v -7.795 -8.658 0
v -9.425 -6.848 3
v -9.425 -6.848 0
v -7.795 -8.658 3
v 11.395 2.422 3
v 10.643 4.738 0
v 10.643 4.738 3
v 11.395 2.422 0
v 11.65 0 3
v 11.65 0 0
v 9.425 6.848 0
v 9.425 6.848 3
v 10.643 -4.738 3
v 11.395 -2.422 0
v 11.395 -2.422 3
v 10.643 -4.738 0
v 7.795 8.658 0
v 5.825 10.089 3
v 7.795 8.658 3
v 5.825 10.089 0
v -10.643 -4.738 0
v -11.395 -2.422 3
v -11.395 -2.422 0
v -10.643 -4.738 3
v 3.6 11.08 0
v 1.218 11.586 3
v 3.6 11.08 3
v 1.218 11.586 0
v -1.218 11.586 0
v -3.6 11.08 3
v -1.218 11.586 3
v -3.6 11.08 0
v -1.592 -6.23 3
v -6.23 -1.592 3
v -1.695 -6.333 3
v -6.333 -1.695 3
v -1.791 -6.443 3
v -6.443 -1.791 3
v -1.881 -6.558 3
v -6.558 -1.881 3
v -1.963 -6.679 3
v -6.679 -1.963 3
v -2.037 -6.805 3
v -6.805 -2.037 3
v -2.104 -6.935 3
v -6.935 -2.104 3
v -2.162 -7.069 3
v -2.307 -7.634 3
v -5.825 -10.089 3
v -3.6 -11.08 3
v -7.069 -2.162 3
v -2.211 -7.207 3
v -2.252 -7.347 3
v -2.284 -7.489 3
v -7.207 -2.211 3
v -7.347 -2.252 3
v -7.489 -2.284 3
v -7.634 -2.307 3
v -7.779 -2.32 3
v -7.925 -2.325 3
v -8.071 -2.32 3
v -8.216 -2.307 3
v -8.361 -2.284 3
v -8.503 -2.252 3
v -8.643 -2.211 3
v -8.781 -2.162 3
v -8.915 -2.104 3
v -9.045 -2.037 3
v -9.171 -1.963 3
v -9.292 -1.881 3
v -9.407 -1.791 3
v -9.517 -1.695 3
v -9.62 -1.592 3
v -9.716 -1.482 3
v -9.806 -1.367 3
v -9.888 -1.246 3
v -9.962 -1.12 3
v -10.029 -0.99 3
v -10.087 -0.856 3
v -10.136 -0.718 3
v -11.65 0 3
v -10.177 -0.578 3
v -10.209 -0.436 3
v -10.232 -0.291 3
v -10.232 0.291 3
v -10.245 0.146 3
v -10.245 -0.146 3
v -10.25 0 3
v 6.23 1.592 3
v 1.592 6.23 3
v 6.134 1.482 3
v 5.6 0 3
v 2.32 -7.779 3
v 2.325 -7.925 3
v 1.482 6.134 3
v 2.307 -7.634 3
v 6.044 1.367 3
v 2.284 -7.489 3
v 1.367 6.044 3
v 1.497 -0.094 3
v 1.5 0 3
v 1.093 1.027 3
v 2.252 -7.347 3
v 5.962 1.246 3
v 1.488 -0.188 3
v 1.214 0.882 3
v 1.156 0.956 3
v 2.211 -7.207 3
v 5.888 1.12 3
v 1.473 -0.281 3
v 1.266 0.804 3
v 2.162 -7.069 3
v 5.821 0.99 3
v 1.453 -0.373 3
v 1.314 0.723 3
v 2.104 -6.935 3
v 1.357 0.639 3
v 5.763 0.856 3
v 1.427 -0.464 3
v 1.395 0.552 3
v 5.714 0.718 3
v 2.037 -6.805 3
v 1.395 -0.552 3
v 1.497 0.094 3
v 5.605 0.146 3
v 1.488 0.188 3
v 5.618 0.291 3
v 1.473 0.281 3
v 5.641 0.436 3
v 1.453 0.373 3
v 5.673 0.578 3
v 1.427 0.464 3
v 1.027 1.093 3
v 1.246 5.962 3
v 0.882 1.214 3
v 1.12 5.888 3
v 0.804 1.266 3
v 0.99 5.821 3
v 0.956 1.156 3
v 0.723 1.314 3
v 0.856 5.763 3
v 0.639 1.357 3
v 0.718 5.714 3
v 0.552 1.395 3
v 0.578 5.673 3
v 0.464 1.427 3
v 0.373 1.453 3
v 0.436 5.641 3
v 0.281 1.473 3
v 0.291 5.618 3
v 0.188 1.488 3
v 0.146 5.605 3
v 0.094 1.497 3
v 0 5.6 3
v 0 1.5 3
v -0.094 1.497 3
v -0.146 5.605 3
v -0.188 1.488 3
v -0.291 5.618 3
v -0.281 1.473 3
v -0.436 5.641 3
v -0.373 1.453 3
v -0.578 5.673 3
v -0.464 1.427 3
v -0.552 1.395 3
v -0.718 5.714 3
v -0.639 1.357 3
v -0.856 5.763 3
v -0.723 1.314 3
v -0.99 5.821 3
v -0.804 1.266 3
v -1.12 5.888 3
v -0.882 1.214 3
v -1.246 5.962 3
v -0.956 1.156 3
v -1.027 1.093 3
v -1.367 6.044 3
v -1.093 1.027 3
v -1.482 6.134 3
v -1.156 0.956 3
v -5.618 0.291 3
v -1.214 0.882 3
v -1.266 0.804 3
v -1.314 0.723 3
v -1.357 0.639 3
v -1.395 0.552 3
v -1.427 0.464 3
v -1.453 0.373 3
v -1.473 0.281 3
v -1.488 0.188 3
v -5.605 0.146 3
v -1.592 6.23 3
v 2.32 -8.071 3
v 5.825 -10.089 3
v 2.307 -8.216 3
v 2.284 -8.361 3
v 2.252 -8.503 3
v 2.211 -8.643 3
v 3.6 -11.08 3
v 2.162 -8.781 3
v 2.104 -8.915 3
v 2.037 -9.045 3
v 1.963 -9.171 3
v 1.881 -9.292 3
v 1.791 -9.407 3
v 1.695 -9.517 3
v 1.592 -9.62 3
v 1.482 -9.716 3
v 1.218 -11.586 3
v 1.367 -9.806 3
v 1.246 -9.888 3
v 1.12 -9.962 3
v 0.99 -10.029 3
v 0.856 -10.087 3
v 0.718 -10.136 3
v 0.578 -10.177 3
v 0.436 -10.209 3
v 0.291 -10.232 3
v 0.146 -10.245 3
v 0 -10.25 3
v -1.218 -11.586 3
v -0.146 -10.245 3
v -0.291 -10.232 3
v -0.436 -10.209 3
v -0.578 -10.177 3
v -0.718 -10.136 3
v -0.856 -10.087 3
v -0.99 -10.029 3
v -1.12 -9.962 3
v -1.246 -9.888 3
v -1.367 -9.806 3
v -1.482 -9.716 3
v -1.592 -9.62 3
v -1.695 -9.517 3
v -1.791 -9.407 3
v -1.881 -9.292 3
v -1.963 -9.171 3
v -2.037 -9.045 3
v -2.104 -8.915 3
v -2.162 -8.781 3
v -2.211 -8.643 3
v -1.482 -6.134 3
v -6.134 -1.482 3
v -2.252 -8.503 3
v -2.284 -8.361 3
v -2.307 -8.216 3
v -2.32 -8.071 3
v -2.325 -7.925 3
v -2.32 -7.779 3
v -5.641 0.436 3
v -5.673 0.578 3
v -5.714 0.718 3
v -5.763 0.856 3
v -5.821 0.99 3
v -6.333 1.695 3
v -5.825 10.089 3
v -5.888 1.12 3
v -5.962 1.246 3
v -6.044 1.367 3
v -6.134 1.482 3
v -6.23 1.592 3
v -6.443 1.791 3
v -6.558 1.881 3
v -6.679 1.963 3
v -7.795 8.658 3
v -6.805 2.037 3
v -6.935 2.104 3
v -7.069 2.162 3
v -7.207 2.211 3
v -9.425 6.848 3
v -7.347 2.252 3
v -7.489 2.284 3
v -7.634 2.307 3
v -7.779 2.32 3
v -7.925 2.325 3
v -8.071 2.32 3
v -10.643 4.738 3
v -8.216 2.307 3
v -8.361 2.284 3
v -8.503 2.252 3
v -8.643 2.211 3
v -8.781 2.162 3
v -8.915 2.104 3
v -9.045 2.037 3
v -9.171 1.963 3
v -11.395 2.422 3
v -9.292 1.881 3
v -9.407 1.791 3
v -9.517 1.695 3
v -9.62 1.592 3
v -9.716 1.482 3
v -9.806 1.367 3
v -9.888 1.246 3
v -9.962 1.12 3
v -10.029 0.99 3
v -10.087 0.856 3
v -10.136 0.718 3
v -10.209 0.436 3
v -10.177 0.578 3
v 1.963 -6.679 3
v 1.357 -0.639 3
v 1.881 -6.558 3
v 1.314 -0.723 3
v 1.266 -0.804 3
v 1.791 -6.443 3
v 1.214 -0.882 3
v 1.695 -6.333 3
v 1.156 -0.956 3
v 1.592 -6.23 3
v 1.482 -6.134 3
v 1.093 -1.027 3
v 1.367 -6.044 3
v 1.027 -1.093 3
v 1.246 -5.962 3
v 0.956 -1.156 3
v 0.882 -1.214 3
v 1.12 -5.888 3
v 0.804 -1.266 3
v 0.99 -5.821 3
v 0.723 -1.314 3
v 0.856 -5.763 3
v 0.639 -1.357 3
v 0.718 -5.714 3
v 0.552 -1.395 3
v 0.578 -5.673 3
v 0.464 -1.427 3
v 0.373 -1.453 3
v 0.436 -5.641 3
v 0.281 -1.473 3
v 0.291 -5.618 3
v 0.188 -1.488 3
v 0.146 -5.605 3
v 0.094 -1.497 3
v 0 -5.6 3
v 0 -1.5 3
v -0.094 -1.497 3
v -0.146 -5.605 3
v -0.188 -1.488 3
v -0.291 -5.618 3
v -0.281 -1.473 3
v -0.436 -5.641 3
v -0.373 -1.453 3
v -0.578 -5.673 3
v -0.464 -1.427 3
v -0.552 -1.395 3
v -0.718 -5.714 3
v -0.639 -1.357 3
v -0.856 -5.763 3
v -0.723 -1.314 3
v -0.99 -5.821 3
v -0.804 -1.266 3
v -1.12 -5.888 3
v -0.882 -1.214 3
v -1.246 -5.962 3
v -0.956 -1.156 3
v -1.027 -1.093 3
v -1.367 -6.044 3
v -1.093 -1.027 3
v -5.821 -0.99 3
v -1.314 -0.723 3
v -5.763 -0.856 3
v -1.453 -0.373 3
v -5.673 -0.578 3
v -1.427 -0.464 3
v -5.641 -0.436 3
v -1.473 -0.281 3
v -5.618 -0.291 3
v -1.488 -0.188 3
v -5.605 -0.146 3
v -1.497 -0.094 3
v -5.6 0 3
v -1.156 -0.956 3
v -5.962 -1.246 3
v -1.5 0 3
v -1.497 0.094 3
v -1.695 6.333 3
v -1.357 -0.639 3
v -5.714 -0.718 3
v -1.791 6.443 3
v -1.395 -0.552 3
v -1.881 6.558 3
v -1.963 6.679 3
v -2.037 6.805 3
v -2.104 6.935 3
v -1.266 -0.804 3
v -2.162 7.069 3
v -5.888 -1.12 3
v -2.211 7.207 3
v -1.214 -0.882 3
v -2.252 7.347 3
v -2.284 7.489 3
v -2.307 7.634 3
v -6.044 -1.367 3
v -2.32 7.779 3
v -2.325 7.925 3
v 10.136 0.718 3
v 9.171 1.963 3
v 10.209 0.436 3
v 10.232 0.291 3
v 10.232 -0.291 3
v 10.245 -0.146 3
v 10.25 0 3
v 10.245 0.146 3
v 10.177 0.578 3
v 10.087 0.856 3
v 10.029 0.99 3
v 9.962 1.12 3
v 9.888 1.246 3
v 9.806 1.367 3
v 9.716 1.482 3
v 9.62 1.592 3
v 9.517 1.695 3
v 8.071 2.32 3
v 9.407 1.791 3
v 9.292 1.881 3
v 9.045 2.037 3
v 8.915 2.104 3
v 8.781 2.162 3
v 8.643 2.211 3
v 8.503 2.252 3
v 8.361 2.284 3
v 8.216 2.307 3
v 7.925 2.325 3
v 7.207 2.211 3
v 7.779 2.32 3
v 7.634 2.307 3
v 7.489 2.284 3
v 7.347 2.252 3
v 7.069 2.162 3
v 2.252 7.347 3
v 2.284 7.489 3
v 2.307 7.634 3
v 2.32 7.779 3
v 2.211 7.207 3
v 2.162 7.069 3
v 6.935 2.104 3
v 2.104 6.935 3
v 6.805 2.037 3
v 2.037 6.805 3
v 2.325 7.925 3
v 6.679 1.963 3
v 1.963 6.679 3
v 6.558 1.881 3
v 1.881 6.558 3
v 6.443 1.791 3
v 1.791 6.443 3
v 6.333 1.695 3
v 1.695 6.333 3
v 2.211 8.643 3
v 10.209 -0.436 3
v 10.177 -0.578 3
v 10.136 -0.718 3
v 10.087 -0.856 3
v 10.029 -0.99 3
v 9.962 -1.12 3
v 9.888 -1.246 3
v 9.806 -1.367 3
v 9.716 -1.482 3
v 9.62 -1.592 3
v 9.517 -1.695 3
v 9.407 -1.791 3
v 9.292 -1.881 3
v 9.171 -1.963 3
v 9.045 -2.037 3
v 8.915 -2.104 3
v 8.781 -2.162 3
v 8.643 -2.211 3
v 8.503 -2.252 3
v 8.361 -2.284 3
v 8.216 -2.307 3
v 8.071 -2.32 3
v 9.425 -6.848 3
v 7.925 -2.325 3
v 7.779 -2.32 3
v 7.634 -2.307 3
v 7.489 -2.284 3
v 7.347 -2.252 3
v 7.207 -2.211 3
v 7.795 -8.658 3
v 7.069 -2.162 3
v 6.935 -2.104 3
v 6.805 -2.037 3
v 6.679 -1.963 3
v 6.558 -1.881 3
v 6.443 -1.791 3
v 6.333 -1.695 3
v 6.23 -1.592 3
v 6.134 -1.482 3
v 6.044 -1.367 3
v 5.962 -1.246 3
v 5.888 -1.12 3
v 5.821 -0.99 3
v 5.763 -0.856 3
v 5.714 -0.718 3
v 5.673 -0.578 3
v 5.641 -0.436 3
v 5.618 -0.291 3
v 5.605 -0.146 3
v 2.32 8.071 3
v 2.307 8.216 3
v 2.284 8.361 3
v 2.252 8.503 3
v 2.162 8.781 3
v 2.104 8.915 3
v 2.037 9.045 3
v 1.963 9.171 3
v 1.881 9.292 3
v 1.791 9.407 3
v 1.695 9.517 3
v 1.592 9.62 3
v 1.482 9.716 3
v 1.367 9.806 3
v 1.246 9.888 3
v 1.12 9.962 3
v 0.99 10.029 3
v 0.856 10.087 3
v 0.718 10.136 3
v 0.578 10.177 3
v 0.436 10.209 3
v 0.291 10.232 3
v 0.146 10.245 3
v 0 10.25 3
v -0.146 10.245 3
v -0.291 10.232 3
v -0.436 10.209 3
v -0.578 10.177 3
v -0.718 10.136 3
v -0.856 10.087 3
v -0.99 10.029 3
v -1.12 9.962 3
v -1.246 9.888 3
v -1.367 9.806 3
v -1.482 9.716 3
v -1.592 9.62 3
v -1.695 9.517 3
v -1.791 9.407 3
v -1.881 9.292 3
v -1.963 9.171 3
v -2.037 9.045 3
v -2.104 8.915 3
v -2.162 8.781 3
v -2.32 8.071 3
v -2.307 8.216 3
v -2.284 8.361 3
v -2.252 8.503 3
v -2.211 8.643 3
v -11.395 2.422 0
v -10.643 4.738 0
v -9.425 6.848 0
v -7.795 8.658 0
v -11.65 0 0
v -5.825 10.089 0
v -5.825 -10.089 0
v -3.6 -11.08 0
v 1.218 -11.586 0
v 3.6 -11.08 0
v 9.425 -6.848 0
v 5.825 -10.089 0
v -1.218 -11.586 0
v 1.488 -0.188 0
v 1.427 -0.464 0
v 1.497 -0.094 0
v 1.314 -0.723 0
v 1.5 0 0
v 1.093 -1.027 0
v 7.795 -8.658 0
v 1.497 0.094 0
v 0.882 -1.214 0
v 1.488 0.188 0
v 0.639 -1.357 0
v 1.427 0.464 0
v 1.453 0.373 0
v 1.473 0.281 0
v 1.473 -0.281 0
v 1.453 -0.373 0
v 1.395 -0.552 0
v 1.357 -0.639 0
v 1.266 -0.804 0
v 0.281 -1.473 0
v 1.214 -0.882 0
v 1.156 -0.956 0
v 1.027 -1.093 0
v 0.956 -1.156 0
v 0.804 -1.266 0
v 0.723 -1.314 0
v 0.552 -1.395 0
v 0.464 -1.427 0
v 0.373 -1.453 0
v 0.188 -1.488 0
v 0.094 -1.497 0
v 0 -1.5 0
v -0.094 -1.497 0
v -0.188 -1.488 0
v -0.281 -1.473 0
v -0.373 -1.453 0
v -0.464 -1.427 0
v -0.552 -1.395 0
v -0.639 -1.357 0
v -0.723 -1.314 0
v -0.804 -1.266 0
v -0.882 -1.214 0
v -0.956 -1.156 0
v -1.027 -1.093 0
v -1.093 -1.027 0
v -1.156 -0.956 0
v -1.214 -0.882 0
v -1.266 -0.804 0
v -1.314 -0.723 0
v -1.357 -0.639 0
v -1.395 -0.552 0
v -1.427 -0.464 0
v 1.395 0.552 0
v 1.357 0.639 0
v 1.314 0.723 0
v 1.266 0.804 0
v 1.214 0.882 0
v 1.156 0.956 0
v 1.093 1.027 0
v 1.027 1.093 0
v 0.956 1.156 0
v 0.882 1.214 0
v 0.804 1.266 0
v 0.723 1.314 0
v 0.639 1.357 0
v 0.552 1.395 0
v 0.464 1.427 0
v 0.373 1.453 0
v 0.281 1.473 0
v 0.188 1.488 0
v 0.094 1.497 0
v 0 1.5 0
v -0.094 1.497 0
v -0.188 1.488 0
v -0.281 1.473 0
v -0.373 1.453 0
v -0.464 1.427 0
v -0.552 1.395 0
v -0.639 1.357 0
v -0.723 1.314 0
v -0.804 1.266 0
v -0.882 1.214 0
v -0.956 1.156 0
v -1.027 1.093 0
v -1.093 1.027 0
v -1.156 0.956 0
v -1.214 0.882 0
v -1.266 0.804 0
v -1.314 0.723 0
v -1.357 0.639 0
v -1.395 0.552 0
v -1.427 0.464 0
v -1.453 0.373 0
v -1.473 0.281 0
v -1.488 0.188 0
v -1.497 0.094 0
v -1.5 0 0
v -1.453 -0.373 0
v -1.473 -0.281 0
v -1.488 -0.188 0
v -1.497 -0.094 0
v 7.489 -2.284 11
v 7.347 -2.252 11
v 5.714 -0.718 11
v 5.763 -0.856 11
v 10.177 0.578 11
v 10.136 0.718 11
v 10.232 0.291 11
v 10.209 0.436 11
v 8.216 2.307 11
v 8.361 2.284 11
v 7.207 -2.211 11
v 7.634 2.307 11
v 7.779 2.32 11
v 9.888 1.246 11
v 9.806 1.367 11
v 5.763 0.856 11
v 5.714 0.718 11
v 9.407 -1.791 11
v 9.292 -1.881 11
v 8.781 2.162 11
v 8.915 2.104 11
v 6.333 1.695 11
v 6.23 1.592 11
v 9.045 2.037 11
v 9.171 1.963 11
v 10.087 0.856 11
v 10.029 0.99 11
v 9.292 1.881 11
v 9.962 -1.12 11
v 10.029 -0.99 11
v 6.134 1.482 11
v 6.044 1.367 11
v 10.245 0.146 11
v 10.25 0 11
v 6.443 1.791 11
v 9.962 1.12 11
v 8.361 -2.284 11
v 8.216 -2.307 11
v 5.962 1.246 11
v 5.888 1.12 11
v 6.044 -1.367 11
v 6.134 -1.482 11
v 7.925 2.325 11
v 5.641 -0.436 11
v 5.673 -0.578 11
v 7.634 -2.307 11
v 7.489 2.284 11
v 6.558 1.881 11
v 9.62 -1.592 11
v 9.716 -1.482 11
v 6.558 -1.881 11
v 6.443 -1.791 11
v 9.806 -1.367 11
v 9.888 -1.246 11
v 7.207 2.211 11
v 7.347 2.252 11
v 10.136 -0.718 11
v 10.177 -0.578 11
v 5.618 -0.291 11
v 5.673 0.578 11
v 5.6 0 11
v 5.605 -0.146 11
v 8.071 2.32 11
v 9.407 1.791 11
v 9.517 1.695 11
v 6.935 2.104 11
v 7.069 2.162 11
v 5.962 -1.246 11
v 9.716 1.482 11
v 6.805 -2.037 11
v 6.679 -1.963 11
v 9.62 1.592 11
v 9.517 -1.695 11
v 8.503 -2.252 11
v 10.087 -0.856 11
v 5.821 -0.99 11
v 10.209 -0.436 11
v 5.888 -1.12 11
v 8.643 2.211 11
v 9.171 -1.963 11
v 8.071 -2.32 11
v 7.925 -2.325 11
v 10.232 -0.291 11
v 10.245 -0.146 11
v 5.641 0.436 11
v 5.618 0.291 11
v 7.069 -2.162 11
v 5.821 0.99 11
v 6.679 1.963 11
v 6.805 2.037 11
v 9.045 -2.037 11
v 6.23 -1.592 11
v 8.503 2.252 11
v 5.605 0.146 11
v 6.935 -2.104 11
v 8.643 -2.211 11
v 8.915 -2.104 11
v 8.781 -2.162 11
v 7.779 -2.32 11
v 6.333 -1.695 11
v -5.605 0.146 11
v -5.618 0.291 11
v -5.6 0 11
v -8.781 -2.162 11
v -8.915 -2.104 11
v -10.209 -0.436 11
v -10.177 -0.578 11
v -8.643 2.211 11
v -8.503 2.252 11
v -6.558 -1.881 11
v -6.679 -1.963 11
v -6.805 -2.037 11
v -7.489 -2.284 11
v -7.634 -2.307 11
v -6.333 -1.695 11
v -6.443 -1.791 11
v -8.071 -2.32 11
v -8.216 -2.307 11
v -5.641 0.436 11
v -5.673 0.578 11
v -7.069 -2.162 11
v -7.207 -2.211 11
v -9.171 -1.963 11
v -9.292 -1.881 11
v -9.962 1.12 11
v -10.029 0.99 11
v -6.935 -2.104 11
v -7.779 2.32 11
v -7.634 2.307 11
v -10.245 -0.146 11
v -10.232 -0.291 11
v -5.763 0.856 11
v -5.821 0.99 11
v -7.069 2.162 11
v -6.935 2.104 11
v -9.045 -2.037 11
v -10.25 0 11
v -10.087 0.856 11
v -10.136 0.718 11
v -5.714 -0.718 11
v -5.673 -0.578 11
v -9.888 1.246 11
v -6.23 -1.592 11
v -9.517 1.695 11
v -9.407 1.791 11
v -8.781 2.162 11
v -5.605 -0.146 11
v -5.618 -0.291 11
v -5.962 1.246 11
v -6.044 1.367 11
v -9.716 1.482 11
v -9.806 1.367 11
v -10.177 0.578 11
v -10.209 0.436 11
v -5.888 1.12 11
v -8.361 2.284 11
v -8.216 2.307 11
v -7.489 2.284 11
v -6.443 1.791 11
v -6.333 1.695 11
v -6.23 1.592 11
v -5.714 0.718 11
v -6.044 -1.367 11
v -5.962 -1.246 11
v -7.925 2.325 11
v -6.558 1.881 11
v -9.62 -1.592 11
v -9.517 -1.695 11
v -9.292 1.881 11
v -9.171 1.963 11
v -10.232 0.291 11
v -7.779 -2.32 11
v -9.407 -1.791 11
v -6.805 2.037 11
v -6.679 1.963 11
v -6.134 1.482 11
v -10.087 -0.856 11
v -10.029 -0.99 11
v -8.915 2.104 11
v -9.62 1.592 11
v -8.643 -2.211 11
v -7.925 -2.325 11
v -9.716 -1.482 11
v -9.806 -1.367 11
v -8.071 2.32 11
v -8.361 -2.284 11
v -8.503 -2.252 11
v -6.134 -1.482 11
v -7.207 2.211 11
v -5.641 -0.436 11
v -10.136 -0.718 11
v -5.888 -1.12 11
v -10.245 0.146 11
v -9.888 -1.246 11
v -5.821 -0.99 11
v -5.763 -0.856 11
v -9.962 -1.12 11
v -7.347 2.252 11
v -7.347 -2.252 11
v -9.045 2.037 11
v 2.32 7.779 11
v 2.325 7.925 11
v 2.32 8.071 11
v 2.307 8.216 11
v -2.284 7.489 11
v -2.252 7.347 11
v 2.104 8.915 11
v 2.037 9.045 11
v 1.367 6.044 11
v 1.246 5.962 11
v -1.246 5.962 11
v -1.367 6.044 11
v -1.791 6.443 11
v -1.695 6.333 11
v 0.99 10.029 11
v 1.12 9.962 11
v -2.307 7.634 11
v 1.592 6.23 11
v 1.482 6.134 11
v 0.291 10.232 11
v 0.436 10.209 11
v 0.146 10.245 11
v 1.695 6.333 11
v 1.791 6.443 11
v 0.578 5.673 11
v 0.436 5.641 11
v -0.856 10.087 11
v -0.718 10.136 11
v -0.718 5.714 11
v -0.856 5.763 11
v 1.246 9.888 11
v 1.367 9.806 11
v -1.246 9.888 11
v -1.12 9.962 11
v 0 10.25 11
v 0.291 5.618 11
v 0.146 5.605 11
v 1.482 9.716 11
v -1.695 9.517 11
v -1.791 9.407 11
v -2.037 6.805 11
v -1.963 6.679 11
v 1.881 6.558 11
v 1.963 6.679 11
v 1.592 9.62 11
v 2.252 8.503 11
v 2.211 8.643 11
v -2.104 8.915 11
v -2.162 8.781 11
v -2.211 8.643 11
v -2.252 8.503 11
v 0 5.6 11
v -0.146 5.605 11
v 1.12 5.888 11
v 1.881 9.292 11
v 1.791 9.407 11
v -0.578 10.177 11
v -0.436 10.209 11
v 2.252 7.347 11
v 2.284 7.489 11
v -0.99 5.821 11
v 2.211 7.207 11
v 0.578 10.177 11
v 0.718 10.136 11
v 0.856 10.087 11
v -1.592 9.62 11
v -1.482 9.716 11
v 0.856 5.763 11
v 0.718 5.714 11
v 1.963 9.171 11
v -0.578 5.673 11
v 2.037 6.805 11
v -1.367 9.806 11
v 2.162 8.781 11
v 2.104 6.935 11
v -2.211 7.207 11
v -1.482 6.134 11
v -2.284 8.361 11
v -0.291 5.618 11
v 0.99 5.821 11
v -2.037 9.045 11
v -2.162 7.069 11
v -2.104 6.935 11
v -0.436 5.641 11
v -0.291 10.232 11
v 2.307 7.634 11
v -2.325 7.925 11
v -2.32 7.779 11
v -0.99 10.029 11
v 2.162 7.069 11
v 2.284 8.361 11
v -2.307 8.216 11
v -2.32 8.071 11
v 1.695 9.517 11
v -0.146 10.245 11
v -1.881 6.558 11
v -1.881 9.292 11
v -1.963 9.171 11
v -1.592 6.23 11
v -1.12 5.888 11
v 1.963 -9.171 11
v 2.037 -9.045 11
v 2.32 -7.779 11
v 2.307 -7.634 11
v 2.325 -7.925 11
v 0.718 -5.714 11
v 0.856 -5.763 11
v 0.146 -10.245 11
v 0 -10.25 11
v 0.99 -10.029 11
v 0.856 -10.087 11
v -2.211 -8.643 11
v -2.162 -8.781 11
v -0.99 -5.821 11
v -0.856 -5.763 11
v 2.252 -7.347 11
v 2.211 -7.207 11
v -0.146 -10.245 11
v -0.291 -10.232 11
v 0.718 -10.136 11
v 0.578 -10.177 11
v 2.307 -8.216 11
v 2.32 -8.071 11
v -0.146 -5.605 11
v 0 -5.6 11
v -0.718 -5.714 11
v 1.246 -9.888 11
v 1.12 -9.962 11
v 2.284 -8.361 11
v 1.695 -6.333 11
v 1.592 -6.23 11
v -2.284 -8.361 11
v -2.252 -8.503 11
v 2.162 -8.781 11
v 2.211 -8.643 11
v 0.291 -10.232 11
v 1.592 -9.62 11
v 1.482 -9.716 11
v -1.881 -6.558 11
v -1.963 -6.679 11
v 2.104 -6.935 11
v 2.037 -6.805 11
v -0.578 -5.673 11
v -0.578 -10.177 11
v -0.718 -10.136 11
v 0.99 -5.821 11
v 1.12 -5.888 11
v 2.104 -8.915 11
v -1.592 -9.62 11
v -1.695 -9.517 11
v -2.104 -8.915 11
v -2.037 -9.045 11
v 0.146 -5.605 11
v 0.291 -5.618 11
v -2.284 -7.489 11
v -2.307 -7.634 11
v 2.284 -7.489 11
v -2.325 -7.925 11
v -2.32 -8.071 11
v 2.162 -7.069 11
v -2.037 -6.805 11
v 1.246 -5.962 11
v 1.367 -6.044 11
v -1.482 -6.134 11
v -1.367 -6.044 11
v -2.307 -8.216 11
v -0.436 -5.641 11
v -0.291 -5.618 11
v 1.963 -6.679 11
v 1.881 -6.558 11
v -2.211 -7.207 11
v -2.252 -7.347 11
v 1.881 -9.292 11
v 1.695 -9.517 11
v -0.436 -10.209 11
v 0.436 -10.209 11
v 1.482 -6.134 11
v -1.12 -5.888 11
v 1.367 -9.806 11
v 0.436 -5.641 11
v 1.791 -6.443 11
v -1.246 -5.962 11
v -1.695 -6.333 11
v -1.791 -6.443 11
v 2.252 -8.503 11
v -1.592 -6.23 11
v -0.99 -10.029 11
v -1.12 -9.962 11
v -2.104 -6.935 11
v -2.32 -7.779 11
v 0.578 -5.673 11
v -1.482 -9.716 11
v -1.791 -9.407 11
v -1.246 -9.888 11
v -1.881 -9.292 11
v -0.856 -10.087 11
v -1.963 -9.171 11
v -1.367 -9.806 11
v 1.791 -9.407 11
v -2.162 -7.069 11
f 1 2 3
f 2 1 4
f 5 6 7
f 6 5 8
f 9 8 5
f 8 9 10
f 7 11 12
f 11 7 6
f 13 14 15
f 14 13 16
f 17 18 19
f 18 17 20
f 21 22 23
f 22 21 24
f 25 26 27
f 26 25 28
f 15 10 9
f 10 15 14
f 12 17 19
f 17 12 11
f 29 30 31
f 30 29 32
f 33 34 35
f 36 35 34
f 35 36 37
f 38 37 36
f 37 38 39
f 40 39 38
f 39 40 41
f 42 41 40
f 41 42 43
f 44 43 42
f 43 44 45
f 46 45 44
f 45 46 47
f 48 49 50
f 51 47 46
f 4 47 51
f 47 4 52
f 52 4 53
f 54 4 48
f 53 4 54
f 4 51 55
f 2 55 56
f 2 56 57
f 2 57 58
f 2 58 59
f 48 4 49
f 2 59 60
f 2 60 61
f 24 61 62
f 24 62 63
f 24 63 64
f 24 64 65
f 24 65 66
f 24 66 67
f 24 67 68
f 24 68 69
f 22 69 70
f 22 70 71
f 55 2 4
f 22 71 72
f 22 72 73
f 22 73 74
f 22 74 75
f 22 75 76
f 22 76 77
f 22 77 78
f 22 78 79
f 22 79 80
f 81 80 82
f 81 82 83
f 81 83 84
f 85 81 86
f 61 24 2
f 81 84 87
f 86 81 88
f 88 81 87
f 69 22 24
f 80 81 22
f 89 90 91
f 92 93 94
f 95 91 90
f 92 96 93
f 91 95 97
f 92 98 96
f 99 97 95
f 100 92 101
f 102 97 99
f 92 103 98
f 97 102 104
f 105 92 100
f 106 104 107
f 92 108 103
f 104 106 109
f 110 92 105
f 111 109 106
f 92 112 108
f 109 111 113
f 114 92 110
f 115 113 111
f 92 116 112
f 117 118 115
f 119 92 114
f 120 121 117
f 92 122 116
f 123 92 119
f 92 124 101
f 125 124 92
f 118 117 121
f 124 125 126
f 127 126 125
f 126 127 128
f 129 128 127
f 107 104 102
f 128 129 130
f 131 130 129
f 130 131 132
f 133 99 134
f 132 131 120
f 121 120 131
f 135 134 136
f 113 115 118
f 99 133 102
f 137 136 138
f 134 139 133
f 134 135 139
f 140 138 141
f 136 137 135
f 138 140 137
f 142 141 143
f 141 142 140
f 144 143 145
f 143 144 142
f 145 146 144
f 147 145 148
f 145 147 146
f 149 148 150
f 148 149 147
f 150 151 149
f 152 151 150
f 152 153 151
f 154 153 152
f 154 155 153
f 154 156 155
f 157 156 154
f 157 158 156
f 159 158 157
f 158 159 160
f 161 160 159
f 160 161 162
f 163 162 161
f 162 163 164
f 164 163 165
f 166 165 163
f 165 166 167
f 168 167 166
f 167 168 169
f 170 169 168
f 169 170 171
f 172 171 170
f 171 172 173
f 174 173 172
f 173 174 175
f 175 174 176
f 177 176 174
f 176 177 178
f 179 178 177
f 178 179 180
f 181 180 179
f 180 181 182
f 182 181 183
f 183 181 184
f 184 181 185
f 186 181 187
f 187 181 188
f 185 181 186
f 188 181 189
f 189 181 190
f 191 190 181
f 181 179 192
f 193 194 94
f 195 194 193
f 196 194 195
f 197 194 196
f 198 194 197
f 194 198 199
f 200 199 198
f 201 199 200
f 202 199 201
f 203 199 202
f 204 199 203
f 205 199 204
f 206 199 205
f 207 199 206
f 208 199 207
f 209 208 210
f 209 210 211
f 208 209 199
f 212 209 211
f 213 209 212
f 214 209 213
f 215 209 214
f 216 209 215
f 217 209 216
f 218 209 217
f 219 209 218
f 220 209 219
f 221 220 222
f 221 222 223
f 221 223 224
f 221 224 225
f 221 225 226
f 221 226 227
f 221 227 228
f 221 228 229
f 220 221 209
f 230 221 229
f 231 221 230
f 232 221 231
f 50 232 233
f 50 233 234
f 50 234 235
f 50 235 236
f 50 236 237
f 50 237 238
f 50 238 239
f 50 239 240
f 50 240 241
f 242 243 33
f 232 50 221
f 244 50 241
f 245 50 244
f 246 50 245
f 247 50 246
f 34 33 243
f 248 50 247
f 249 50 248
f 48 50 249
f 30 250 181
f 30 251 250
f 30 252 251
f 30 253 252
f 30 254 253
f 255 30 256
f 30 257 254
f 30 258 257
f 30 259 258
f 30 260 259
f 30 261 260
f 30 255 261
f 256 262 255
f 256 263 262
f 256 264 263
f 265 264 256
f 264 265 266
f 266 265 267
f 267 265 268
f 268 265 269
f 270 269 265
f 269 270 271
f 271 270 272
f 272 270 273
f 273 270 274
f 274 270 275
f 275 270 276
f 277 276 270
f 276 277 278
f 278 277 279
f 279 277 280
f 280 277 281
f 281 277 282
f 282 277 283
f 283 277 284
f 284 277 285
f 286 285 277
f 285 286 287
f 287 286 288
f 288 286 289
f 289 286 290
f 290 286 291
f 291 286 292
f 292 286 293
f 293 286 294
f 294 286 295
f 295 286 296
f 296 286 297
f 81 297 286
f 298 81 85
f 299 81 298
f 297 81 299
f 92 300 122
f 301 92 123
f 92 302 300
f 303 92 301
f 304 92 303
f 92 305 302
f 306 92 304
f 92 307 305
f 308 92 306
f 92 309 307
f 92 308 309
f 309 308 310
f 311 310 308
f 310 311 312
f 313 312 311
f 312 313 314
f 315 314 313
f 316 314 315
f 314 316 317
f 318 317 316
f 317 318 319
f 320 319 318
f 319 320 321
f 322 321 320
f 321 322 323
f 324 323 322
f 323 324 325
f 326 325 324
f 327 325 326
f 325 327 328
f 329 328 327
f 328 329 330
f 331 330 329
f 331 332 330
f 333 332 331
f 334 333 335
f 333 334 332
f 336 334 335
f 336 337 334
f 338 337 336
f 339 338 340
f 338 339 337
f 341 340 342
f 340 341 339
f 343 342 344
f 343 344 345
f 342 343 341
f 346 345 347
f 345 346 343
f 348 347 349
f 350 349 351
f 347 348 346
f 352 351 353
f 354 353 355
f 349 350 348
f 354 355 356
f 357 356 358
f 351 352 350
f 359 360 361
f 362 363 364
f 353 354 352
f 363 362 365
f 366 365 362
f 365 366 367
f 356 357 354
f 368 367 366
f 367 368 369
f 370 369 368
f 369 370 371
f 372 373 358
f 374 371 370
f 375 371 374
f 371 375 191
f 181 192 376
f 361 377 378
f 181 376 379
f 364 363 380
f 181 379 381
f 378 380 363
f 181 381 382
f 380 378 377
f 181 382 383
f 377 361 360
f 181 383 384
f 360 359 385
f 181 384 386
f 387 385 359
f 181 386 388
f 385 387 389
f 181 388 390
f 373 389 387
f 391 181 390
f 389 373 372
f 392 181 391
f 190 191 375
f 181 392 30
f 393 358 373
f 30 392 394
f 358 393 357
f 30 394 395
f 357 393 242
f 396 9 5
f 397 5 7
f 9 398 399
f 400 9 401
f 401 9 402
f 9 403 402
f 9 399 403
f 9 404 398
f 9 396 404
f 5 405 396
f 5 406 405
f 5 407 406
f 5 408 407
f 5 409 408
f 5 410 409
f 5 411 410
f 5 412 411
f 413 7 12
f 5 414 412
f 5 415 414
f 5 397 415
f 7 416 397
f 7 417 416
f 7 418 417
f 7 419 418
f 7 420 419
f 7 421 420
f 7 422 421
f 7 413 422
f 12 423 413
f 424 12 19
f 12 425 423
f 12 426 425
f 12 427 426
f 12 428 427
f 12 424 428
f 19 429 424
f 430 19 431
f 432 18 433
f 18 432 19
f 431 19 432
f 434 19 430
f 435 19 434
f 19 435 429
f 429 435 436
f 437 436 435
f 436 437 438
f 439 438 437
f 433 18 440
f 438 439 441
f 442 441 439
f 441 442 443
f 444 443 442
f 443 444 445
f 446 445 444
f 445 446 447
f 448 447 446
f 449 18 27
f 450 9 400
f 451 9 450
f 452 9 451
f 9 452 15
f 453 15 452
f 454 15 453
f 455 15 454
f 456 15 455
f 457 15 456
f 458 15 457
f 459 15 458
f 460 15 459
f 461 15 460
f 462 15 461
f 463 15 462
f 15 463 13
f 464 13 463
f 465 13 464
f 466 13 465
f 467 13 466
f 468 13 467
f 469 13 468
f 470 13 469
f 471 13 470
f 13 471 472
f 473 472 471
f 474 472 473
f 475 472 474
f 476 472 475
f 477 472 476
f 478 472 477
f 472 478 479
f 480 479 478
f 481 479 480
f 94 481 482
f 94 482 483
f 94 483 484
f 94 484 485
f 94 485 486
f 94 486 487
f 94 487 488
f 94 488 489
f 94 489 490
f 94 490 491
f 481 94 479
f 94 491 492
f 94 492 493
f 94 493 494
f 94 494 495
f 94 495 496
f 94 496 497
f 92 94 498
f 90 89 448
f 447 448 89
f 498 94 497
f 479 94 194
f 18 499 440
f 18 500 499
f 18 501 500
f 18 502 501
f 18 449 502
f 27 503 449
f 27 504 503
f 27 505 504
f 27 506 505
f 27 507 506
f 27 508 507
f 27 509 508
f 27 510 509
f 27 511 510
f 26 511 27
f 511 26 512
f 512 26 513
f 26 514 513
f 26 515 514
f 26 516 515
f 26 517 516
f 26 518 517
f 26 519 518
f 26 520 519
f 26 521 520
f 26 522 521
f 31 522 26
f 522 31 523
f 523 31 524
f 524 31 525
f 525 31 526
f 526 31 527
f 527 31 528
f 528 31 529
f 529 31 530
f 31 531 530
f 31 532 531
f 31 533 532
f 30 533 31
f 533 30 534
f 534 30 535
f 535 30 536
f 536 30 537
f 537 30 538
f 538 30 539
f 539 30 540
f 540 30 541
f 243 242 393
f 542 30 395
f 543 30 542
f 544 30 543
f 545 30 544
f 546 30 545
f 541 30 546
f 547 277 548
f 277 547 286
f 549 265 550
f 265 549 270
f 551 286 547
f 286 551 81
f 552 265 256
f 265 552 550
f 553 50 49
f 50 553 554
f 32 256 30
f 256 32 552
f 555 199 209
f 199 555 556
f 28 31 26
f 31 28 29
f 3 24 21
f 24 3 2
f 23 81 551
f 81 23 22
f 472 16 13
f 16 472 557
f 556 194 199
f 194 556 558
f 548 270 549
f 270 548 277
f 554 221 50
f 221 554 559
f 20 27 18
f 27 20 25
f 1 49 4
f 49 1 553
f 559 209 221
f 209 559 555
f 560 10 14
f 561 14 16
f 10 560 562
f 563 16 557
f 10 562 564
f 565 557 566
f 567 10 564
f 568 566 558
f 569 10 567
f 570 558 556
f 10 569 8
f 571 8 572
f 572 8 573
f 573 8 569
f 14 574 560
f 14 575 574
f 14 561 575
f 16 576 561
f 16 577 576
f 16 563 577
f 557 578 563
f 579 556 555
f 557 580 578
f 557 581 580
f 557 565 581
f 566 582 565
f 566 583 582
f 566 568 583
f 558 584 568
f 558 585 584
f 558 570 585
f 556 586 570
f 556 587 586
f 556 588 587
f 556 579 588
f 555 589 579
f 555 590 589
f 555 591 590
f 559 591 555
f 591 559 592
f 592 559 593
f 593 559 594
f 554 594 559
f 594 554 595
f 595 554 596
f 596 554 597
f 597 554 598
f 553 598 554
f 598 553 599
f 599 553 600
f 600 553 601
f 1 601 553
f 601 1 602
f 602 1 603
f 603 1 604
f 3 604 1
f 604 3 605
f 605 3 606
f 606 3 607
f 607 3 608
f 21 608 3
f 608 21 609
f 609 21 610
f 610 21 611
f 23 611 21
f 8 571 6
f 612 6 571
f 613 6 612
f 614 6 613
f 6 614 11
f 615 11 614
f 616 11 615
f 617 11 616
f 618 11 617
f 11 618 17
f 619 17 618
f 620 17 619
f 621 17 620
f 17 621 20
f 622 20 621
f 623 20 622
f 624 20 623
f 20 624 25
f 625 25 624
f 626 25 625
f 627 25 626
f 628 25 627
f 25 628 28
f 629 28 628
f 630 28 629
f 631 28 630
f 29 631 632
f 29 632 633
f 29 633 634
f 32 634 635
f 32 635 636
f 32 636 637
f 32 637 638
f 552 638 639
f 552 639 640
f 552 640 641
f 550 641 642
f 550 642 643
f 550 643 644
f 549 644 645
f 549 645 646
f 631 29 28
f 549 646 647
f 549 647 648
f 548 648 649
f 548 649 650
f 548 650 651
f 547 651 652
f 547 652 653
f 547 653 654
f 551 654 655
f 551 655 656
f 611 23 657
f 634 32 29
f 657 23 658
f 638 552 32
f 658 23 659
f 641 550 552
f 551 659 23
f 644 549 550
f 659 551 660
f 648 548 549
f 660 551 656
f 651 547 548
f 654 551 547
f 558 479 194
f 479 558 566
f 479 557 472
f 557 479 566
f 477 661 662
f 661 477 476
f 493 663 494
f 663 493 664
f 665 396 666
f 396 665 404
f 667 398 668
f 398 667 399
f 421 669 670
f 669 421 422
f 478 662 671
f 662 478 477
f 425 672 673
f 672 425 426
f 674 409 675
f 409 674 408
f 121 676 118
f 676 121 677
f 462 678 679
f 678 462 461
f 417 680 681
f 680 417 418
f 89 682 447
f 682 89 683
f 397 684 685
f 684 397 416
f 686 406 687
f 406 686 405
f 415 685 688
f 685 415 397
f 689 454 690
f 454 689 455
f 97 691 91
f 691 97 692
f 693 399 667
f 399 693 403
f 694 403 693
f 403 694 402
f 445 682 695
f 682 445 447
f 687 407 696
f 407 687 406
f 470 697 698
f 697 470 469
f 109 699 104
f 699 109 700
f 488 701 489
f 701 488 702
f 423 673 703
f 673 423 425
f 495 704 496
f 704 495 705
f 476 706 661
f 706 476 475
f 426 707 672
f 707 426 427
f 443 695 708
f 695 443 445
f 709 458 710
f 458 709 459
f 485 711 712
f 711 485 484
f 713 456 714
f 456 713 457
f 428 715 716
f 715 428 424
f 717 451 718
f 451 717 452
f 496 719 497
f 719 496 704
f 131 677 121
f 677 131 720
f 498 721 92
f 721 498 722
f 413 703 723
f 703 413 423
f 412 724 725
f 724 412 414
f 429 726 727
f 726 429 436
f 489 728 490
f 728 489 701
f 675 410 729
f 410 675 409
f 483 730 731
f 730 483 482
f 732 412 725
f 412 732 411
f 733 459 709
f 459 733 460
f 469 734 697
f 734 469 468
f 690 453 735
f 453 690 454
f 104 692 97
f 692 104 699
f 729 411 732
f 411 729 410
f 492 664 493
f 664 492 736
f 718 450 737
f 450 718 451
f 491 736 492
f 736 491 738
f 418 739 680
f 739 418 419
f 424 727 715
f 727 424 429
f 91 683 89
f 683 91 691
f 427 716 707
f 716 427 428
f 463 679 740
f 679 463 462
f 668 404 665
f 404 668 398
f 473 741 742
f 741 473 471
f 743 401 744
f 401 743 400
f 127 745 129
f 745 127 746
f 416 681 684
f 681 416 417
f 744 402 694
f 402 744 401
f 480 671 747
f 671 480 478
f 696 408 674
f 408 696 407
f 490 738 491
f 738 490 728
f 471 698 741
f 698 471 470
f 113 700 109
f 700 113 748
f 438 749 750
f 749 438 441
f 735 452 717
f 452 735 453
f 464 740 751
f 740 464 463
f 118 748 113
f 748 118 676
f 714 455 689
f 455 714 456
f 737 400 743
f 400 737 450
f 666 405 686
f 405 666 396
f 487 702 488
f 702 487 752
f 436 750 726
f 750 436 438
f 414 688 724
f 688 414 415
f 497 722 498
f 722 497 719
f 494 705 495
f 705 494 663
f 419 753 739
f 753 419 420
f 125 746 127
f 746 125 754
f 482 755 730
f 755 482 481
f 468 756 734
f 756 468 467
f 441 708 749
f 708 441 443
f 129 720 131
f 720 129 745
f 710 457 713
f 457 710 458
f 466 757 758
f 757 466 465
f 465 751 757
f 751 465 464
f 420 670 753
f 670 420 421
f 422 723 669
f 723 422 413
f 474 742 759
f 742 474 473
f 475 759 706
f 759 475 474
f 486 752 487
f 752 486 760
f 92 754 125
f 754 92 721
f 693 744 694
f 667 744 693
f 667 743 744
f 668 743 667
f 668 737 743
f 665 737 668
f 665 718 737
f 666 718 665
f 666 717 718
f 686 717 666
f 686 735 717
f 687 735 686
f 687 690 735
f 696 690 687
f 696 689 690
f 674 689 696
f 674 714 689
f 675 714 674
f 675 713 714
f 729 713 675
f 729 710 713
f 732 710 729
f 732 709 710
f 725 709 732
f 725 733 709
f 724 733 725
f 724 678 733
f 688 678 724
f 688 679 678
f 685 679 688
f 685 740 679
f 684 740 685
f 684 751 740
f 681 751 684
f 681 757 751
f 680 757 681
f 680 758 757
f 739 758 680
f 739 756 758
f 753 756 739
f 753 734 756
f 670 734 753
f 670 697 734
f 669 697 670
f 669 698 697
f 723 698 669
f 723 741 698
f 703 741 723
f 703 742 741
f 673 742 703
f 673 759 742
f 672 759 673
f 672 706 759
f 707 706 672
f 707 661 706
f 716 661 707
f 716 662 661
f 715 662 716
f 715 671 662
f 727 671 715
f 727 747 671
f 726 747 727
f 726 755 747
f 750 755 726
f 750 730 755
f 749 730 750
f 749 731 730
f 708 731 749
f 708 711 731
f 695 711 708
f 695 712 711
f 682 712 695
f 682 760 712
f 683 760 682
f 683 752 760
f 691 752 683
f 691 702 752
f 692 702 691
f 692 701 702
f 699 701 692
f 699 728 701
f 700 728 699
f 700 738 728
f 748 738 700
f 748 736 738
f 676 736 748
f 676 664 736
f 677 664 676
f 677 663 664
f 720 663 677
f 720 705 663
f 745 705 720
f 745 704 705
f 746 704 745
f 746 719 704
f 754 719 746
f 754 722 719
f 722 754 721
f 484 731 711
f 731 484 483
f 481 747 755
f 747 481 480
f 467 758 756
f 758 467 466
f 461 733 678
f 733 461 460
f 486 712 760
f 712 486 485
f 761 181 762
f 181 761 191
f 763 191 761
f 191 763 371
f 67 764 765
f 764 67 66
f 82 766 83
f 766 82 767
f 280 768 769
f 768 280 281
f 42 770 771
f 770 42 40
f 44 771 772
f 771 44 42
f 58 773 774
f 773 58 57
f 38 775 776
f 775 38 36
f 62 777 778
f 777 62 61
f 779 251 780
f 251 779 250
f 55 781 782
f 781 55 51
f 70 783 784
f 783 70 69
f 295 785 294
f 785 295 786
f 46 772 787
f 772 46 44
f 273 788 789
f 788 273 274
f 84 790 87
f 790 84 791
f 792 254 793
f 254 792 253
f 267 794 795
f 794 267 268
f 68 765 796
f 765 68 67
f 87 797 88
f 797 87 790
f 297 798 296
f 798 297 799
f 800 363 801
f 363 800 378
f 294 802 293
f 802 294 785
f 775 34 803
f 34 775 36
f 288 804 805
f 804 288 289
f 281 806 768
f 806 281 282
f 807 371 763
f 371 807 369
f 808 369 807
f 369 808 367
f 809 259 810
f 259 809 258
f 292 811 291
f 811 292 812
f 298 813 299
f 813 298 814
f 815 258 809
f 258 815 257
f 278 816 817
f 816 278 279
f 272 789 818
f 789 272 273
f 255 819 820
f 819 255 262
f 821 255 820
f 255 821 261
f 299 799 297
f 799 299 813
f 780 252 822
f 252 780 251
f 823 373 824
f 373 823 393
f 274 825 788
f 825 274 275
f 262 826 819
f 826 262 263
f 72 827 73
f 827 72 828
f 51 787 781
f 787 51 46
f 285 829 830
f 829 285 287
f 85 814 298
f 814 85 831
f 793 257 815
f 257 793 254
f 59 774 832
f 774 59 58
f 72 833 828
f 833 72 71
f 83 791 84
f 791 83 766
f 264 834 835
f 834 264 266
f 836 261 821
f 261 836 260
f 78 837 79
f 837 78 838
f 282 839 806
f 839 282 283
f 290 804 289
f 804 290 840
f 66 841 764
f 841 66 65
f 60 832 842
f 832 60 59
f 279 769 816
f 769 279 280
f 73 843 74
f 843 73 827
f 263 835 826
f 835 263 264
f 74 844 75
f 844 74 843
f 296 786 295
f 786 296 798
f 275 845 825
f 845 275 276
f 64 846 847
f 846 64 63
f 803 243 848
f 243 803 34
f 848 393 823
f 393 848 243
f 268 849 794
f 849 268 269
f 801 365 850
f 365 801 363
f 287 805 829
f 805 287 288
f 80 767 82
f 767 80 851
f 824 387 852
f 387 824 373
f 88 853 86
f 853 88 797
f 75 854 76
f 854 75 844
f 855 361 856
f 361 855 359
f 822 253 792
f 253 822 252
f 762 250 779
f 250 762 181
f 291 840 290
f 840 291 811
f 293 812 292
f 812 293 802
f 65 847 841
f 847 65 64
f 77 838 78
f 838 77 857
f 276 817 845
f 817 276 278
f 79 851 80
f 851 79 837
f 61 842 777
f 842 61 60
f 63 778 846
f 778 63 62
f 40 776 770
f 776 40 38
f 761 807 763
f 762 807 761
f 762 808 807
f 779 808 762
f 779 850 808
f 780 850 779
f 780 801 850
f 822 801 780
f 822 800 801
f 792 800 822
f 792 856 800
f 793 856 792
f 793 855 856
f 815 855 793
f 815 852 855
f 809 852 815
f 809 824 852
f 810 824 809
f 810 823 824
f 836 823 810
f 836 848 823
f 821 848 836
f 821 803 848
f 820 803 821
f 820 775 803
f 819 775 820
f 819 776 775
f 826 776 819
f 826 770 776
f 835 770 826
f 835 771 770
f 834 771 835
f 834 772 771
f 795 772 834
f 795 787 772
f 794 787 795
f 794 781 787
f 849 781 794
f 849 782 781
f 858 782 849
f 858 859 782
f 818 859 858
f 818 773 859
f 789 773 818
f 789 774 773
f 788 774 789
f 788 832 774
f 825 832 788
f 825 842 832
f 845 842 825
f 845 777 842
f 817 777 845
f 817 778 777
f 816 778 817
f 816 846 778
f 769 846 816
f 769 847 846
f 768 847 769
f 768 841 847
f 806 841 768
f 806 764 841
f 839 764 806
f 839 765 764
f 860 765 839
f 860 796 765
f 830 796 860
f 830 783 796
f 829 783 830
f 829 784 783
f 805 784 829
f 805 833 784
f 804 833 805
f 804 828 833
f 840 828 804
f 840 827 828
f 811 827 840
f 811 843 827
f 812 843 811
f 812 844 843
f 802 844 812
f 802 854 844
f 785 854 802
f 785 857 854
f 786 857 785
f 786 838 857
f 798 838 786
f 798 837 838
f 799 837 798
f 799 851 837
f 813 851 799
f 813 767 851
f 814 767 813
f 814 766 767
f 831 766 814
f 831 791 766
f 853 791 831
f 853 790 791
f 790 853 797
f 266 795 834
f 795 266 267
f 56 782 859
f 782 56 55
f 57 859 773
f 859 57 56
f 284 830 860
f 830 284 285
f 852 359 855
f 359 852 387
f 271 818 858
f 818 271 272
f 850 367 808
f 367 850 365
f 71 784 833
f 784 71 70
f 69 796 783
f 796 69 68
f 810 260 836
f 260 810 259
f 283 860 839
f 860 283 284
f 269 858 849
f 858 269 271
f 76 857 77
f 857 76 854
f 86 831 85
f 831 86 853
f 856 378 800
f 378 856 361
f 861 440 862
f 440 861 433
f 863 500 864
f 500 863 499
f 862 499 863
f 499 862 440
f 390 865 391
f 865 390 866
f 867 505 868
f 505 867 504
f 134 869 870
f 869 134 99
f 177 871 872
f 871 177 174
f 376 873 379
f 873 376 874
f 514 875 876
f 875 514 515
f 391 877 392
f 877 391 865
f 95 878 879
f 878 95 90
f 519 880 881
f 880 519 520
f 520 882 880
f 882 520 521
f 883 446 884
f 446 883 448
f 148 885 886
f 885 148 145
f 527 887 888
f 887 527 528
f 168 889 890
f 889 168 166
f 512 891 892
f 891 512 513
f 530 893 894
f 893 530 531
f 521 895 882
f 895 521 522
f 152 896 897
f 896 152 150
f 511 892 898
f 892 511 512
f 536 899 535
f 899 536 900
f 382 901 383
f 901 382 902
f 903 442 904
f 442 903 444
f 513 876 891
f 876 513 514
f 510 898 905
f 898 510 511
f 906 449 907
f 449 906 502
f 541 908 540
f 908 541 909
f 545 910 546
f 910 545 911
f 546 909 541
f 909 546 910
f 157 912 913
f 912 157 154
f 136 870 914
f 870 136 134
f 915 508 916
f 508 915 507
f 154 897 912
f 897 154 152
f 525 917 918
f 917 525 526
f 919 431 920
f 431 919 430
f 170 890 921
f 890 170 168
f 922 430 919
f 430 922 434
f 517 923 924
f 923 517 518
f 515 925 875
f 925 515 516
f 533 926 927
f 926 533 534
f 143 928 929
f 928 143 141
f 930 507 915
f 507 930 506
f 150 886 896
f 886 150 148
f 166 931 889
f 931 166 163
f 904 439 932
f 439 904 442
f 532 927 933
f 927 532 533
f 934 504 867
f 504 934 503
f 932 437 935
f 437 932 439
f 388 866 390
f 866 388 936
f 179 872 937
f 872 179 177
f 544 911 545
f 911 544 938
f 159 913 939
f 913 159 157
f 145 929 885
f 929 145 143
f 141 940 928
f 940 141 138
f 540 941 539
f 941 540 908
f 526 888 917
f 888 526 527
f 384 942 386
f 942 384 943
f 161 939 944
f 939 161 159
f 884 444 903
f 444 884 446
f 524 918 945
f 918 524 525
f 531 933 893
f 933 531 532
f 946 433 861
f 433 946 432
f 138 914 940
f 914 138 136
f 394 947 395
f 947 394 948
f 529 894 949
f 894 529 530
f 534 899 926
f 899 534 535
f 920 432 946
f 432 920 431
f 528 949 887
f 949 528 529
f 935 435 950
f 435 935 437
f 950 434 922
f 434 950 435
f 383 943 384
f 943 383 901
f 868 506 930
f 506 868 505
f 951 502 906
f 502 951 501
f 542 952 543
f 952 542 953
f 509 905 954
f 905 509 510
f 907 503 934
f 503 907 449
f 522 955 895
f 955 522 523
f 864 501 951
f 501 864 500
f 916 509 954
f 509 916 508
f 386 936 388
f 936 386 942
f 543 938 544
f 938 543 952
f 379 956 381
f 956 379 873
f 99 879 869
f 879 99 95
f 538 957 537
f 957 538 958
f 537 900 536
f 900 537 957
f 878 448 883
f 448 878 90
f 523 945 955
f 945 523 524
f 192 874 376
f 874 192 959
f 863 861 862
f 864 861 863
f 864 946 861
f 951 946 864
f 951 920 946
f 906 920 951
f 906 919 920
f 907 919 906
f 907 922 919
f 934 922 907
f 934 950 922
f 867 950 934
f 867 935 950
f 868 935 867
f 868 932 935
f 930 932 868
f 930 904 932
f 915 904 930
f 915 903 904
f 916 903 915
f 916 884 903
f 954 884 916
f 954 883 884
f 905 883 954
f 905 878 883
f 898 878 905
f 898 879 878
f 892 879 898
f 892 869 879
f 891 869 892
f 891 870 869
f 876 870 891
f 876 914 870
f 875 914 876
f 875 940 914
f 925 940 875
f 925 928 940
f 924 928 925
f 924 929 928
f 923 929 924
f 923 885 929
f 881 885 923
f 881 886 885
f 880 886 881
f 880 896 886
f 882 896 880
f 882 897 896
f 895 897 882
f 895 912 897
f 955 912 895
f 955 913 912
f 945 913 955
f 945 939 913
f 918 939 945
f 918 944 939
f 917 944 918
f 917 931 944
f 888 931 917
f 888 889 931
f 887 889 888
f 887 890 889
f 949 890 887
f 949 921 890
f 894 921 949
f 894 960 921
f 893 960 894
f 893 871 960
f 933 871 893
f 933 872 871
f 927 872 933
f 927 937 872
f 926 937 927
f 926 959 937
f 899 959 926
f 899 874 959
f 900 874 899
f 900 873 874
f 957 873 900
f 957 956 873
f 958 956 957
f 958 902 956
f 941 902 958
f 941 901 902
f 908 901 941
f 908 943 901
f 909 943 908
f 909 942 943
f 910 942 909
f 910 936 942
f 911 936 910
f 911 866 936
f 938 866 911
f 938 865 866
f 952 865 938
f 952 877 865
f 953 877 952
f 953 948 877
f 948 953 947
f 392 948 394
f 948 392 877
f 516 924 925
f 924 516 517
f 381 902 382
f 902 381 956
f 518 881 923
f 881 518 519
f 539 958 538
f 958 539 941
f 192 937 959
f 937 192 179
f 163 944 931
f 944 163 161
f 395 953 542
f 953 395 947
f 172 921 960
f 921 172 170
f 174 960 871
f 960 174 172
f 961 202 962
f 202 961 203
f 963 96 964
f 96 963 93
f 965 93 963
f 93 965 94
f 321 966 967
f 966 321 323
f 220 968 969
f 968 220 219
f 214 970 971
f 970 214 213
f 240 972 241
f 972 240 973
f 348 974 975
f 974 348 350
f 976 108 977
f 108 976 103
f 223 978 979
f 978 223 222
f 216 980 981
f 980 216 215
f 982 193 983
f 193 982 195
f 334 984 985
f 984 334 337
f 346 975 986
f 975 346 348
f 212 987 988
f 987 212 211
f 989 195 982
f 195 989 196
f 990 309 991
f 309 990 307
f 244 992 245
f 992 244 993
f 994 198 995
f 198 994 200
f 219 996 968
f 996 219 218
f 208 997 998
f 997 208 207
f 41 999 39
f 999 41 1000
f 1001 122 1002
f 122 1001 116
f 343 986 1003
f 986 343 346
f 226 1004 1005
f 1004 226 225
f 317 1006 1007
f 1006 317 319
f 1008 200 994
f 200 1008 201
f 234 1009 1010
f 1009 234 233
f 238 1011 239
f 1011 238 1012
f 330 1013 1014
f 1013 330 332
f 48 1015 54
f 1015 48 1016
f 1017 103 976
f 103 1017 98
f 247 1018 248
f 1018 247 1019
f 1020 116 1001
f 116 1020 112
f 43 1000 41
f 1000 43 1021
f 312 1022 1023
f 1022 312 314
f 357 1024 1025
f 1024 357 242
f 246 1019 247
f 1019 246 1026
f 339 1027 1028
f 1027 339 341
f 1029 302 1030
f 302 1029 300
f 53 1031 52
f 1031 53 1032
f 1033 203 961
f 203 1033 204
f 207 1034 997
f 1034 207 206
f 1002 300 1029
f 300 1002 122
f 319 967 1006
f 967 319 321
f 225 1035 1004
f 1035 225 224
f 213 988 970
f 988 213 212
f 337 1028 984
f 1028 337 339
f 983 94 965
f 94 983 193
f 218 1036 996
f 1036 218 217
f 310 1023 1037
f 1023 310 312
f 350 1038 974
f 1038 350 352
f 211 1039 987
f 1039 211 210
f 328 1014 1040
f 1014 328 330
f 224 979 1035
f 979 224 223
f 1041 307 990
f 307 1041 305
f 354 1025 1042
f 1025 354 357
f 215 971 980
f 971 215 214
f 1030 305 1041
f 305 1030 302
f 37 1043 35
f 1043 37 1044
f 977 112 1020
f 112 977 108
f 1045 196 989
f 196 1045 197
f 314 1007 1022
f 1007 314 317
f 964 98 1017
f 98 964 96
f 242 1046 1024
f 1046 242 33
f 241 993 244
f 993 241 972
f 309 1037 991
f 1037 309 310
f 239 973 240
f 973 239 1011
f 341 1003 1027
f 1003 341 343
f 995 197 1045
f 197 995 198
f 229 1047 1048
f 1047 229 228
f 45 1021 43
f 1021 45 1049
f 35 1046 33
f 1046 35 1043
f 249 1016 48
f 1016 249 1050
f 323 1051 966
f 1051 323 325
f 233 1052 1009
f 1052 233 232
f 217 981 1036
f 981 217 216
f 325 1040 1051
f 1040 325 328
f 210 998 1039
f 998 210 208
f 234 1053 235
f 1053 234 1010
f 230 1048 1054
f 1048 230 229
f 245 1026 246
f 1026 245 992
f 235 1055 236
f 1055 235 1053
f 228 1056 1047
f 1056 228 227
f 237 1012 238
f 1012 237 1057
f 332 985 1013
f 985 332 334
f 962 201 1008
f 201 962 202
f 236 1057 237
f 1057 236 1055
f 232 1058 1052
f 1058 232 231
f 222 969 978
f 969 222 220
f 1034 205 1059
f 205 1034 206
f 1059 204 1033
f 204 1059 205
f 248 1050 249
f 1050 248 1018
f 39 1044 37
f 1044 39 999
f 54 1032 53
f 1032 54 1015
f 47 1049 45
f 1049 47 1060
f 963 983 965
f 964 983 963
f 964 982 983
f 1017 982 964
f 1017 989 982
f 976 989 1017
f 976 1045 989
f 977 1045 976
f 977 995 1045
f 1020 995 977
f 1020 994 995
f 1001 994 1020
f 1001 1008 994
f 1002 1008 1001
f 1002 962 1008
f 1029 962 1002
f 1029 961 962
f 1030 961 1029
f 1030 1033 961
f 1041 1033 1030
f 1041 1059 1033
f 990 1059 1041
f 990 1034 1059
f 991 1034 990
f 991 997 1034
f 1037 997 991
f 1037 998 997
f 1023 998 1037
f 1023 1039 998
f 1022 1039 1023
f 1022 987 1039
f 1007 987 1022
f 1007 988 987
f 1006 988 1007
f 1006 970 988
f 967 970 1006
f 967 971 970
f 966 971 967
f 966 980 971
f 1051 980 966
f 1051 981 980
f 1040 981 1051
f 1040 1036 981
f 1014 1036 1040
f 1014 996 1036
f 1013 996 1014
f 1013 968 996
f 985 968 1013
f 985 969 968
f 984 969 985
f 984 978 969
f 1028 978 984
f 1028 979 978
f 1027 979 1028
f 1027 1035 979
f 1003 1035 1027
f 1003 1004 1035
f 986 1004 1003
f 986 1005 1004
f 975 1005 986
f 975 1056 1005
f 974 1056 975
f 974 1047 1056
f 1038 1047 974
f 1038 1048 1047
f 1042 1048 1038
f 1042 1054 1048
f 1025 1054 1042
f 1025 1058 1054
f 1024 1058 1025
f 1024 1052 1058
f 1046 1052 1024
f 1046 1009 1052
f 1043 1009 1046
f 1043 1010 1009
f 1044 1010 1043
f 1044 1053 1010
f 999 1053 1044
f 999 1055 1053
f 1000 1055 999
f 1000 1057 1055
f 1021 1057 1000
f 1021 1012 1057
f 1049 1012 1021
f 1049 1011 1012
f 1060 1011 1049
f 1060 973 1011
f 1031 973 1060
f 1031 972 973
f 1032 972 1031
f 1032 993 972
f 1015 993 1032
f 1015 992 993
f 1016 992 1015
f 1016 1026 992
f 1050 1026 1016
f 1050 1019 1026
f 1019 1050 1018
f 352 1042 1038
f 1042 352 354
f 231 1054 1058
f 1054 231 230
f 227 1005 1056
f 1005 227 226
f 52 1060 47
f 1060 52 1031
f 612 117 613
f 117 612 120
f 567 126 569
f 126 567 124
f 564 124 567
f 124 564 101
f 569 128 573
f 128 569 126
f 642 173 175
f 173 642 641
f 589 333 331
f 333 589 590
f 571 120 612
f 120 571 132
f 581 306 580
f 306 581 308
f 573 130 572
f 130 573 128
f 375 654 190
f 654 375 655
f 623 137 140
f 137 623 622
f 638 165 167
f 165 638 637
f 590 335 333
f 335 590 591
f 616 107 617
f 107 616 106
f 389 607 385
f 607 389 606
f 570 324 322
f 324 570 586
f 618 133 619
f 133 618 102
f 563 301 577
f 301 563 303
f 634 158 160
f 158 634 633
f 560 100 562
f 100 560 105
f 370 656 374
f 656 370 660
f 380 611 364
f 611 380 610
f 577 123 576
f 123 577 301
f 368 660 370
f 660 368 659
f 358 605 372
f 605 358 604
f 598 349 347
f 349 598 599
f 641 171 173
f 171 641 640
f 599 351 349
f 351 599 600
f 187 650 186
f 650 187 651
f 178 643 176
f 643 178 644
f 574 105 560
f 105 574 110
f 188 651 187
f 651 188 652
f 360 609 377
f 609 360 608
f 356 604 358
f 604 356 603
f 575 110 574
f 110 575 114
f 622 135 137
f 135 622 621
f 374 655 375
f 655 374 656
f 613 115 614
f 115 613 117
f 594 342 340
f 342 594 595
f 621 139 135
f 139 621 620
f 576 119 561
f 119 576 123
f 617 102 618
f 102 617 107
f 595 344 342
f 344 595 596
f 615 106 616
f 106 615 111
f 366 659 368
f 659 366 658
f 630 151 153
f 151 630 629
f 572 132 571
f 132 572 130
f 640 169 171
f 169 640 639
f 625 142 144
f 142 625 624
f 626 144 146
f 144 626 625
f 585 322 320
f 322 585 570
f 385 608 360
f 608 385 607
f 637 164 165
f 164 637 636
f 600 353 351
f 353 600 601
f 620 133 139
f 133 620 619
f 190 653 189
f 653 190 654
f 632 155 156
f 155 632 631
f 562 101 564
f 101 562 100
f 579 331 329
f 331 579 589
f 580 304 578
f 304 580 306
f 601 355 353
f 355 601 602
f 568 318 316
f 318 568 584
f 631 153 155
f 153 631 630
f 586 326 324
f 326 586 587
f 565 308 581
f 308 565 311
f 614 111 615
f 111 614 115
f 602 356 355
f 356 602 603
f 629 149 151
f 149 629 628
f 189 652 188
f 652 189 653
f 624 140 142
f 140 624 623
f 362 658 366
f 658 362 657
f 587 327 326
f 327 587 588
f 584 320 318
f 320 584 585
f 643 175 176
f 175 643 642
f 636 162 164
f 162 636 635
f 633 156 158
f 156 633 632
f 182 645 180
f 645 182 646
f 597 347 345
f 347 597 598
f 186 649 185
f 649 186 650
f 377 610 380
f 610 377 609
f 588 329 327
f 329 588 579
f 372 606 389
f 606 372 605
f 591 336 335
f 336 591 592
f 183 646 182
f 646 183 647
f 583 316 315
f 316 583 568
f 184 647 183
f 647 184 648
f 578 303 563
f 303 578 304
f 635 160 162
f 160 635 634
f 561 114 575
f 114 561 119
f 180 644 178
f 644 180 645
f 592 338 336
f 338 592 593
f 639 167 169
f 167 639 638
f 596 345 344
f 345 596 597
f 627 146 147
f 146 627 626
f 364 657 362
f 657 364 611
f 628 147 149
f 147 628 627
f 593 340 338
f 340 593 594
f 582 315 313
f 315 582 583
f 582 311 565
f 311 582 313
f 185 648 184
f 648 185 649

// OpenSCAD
h_cylinder = 3;
h_peripherical_legs = 11;
radius_peripherical_legs = 2.325;
radius_central_hole = 1.5;
radius_cylinder = 11.65;
marginal_distance = 1.4;
per_leg_trans = radius_cylinder-radius_peripherical_legs-marginal_distance;

module motor_cap() {
	difference() {
		union() {
		// Main cylinder
		cylinder(h = h_cylinder, r = radius_cylinder, center = false);	

		// Peripherical legs
		translate([per_leg_trans, 0, 0]) color("black") cylinder(h = h_peripherical_legs, r = radius_peripherical_legs, center = false, $fn = 100);
		translate([-per_leg_trans, 0, 0]) color("black") cylinder(h = h_peripherical_legs, r = radius_peripherical_legs, center = false, $fn = 100);
		translate([0, per_leg_trans, 0]) color("black") cylinder(h = h_peripherical_legs, r = radius_peripherical_legs, center = false, $fn = 100);
		translate([0, -per_leg_trans, 0]) color("black") cylinder(h = h_peripherical_legs, r = radius_peripherical_legs, center = false, $fn = 100);
		}
		// Central hole
		cylinder(h = h_cylinder, r = radius_central_hole, center = false, $fn = 100);
	}
}

 motor_cap();
